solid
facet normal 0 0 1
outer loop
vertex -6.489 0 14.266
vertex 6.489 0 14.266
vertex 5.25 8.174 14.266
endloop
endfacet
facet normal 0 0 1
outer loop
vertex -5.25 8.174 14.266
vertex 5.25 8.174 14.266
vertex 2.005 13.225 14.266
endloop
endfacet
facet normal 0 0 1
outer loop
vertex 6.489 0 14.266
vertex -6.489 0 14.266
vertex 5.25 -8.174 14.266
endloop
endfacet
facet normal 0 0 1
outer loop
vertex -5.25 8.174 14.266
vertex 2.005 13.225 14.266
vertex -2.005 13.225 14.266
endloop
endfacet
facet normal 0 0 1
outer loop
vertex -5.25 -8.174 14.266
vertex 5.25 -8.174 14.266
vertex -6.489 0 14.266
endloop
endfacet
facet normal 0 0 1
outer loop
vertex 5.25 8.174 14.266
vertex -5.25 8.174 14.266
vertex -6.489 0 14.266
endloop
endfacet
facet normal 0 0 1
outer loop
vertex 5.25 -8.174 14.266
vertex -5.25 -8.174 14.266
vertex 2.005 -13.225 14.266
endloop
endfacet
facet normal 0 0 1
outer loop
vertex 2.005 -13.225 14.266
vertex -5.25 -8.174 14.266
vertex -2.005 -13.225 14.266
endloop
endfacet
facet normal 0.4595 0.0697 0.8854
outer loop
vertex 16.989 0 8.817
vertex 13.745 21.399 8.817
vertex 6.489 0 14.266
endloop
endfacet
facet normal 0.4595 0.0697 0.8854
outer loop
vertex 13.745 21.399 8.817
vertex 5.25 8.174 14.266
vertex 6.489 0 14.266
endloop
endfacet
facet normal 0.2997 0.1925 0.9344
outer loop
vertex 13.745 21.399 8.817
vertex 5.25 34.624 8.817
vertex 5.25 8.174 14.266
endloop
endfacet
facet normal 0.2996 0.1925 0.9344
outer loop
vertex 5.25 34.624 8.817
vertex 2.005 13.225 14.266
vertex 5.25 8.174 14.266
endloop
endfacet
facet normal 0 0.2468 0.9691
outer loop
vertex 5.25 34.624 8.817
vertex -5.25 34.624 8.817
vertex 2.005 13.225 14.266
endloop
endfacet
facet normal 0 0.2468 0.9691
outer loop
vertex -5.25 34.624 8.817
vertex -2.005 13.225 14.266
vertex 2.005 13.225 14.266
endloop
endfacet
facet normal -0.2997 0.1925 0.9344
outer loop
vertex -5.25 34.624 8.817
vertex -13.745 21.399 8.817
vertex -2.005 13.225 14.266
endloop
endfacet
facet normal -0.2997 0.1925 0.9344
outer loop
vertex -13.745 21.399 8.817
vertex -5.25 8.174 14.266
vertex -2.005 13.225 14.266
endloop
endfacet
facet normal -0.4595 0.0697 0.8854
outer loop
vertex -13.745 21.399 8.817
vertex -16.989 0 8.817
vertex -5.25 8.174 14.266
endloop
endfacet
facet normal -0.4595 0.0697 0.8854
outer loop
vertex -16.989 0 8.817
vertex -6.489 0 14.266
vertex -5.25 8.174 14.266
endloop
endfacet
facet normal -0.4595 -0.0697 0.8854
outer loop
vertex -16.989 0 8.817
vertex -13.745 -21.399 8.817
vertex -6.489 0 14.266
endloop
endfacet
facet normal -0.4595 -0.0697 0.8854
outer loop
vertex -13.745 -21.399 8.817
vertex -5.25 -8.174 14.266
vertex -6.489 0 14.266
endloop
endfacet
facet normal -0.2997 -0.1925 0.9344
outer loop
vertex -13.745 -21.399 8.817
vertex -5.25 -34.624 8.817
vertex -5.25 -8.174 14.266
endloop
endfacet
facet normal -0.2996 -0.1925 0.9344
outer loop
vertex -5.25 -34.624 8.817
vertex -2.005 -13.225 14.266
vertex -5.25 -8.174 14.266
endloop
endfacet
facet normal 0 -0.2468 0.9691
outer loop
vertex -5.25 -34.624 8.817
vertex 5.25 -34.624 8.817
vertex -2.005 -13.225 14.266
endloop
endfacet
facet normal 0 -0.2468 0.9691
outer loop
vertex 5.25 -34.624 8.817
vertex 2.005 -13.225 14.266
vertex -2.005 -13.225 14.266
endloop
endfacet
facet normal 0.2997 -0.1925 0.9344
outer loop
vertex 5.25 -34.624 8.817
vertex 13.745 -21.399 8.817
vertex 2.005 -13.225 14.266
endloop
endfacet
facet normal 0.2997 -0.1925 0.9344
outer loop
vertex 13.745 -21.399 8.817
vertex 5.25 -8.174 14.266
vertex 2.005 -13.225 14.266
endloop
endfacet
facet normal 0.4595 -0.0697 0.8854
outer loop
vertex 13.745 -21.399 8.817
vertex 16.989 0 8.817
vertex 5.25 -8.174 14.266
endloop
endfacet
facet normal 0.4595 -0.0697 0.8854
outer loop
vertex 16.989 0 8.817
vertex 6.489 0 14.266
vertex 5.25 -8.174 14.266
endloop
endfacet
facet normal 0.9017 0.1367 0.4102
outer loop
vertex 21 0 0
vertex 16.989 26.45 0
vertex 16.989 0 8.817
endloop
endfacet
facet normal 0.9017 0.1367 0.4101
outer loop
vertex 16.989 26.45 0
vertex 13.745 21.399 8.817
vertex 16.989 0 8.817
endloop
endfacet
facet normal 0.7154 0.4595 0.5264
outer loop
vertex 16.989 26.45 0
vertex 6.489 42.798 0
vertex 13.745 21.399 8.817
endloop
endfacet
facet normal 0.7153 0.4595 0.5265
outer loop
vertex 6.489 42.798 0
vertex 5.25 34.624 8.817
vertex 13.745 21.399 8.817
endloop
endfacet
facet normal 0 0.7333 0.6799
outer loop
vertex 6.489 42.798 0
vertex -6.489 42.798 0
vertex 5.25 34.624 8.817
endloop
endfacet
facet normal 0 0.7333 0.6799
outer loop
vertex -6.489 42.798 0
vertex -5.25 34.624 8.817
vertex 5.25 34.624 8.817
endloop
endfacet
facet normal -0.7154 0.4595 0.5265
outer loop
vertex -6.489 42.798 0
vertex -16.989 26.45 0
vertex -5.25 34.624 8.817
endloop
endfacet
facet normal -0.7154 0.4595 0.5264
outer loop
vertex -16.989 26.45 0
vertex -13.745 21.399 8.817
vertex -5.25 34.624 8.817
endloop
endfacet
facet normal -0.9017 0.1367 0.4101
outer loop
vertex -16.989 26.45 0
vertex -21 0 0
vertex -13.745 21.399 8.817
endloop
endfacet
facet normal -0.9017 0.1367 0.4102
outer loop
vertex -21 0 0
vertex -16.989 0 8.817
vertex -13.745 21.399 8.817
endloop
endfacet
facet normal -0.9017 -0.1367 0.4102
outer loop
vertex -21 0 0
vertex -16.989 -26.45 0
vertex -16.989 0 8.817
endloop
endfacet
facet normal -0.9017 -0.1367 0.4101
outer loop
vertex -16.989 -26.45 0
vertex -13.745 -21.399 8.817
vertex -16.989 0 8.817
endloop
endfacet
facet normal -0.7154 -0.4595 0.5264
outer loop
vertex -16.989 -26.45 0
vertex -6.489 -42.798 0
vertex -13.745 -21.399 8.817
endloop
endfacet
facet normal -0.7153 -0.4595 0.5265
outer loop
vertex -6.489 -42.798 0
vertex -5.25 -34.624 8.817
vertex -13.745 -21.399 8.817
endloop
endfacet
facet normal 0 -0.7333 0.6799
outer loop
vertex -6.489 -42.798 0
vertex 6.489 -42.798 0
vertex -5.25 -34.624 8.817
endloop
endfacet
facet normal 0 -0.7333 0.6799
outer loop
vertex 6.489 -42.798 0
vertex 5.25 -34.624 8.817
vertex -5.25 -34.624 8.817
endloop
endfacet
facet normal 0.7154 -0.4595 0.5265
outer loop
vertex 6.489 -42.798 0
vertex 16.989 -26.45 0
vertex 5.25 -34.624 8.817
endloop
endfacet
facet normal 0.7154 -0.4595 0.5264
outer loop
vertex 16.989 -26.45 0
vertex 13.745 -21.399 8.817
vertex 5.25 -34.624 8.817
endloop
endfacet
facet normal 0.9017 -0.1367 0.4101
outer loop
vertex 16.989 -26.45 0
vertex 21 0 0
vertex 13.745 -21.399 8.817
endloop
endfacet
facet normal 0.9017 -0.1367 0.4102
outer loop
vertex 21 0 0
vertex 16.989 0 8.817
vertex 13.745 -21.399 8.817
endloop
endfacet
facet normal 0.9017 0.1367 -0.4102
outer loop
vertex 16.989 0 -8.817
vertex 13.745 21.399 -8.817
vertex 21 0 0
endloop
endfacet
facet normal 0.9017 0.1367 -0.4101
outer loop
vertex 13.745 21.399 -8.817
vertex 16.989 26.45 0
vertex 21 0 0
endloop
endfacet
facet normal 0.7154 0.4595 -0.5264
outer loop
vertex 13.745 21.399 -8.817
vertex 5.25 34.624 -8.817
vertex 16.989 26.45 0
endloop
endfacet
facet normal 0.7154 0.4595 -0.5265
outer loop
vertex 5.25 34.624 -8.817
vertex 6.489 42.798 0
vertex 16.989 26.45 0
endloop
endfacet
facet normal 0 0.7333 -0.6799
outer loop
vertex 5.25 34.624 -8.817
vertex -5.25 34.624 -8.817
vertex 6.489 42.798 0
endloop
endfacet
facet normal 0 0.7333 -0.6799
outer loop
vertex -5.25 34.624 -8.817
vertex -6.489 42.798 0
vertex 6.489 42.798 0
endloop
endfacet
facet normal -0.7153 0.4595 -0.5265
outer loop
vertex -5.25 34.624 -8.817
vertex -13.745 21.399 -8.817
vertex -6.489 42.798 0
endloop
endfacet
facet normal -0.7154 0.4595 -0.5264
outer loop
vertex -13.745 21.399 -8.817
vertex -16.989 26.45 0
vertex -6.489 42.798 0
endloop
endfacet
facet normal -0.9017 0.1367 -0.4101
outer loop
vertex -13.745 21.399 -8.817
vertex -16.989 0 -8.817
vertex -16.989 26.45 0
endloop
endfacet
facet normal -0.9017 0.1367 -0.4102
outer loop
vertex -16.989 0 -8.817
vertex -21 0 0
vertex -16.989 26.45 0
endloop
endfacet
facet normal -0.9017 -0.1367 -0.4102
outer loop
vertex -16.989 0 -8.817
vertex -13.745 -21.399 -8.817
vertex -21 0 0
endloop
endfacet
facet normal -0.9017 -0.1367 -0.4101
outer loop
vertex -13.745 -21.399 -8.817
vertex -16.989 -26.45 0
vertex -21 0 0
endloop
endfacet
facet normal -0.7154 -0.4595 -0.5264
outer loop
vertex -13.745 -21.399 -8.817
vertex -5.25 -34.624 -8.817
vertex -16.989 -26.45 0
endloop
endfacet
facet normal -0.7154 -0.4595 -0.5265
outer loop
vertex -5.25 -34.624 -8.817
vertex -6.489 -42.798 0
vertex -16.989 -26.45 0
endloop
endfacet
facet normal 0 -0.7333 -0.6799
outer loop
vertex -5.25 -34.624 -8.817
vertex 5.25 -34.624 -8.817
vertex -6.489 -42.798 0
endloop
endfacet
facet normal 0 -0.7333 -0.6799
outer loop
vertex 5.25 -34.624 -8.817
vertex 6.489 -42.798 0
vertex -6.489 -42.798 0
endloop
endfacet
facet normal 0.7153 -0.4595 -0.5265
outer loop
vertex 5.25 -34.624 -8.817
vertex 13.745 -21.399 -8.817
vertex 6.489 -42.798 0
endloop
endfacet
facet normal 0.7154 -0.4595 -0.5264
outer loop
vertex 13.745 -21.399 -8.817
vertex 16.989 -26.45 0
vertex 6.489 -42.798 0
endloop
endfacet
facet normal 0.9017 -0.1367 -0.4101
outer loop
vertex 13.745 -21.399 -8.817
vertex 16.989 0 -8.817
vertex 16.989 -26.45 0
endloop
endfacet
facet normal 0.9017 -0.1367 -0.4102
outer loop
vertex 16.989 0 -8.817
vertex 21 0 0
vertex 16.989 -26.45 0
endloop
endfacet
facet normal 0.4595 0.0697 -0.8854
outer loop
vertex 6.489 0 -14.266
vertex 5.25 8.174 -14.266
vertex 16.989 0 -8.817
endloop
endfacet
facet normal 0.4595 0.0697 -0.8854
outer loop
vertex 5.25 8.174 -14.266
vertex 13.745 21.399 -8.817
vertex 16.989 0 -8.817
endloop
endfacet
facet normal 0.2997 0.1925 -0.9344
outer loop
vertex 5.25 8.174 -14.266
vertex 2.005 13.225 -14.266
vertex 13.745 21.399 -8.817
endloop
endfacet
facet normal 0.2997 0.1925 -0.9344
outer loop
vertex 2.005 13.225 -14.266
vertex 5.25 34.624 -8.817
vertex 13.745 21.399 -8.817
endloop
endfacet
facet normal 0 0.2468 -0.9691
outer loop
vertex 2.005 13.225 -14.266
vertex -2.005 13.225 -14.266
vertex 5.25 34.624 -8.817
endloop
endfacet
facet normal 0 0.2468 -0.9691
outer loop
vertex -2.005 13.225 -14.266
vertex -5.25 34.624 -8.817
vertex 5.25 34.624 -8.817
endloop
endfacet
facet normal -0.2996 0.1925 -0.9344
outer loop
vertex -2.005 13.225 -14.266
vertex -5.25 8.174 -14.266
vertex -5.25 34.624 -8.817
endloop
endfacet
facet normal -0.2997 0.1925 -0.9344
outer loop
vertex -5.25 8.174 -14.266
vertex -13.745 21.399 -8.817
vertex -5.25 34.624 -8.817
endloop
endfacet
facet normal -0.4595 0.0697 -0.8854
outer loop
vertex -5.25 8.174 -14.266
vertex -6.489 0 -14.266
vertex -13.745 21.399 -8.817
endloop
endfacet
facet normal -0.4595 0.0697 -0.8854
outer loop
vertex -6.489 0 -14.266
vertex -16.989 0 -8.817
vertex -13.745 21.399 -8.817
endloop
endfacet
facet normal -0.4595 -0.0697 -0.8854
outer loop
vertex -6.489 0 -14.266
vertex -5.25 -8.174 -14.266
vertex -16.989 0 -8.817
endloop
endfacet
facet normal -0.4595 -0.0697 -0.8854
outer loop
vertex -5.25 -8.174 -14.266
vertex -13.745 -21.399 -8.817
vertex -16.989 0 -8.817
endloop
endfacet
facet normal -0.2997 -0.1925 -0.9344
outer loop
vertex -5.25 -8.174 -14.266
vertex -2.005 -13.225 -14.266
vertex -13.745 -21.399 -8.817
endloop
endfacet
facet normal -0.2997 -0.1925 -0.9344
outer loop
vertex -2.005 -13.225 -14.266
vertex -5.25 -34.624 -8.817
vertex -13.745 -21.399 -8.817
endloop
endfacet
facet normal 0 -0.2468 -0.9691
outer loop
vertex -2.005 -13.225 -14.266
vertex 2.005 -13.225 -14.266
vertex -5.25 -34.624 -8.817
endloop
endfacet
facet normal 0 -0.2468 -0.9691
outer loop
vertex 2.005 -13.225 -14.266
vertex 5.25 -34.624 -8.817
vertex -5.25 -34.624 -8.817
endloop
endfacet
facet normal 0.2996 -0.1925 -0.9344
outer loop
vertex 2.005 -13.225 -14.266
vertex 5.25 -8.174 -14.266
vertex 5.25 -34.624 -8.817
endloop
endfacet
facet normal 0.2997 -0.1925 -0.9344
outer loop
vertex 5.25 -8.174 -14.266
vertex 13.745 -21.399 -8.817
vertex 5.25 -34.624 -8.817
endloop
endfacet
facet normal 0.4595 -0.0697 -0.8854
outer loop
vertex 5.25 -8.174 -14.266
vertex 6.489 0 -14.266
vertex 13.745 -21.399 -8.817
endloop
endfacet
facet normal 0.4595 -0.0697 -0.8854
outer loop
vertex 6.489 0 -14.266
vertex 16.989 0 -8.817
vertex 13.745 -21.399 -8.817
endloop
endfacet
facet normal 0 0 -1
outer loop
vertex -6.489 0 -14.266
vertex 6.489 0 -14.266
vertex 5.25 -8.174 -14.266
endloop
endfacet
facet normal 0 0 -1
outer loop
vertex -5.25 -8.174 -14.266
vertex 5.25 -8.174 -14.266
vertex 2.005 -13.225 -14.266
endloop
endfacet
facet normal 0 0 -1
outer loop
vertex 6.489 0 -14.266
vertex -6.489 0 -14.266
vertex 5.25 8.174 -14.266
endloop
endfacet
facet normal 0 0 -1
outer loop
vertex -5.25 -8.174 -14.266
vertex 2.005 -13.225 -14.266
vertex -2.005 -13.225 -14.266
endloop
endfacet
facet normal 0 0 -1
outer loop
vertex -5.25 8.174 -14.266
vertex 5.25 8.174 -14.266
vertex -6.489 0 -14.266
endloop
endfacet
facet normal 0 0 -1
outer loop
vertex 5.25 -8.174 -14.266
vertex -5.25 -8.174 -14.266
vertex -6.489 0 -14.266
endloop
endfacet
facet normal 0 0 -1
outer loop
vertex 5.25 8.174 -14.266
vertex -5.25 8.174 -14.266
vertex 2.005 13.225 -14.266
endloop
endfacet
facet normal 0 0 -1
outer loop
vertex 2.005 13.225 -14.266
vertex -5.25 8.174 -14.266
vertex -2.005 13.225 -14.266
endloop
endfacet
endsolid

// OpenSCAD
// Generated by SolidPython 1.0.1 on 2020-07-29 00:46:48


scale(v = [7, 15, 5]) {
	sphere(r = 3);
}
/***********************************************
*********      SolidPython code:      **********
************************************************
 
# import packages: SolidPython
from solid import *
from solid.utils import *
from itertools import chain, combinations, permutations


class Resize:

    def __init__(self, scad_file):
        self.scad_file = scad_file
        #self.scad_file = import_scad(scad_file)
        # cone/cylinder param:
        self.r1 = 0
        self.r2 = 0
        self.h = 0
        # rectangular prism param:
        self.w = 0
        self.l = 0
        # ellipse param:
        self.r = 0

    # import OpenScad code (file name corresponds to shape)


    # classify shape + parameters
    def assign(self, param1, param2, param3):
        if self.scad_file == 'cone.scad':
            self.r1 = param1
            self.r2 = param2
            self.h = param3
        elif self.scad_file == 'cylinder.scad':
            self.r1 = param1
            self.r2 = param2
            self.h = param3
        elif self.scad_file == 'rectangularPrism.scad':
            self.h = param1
            self.l = param2
            self.w = param3
        else:
            self.r = param1
            self.h = param2

    # resize parameters
    def iterate(self):
        x = range(3, 20, 2)
        i = 1
        if self.scad_file == 'cone.scad':
            tempList = list(permutations(x, 2))
            for temp in tempList:
                param1 = temp[0]
                param2 = temp[1]
                filepath = 'produced_scad_files/' + 'cone' + str(param1) + '_' + str(param2) + '_' + '.scad'
                scad_render_to_file(cylinder(h=param1, r1=param2, r2=0), filepath)

        elif self.scad_file == 'cylinder.scad':
            tempList = list(permutations(x, 3))
            for temp in tempList:
                param1 = temp[0]
                param2 = temp[1]
                filepath = 'produced_scad_files/' + 'cylinder' + str(param1) + '_' + str(param2) + '_' + '.scad'
                scad_render_to_file(cylinder(h=param1, r1=param2, r2=param2), filepath)

        elif self.scad_file == 'rectangularPrism.scad':
            tempList = list(permutations(x, 3))
            for temp in tempList:
                param1 = temp[0]
                param2 = temp[1]
                param3 = temp[2]
                filepath = 'produced_scad_files/' + 'rectangularPrism' + str(param1) + '_' + str(param2) + '_' + str(
                    param3) + '.scad'
                scad_render_to_file(cube(size=(param1, param2, param3)), filepath)

        elif self.scad_file == 'ellipse.scad':
            tempList = list(permutations(x, 4))
            for temp in tempList:
                param1 = temp[0]
                param2 = temp[1]
                param3 = temp[2]
                param4 = temp[3]
                filepath = 'produced_scad_files/' + 'ellipse' + str(param1) + '_' + str(param2) + '_' + str(param3) + '_' + str(param4) + '.scad'
                scad_render_to_file(scale([param1, param2, param3])(sphere(r=param4)), filepath)

    def render_to_scadfile(self):
        scad_render_to_file(scad, 'example.scad') 
 
************************************************/
